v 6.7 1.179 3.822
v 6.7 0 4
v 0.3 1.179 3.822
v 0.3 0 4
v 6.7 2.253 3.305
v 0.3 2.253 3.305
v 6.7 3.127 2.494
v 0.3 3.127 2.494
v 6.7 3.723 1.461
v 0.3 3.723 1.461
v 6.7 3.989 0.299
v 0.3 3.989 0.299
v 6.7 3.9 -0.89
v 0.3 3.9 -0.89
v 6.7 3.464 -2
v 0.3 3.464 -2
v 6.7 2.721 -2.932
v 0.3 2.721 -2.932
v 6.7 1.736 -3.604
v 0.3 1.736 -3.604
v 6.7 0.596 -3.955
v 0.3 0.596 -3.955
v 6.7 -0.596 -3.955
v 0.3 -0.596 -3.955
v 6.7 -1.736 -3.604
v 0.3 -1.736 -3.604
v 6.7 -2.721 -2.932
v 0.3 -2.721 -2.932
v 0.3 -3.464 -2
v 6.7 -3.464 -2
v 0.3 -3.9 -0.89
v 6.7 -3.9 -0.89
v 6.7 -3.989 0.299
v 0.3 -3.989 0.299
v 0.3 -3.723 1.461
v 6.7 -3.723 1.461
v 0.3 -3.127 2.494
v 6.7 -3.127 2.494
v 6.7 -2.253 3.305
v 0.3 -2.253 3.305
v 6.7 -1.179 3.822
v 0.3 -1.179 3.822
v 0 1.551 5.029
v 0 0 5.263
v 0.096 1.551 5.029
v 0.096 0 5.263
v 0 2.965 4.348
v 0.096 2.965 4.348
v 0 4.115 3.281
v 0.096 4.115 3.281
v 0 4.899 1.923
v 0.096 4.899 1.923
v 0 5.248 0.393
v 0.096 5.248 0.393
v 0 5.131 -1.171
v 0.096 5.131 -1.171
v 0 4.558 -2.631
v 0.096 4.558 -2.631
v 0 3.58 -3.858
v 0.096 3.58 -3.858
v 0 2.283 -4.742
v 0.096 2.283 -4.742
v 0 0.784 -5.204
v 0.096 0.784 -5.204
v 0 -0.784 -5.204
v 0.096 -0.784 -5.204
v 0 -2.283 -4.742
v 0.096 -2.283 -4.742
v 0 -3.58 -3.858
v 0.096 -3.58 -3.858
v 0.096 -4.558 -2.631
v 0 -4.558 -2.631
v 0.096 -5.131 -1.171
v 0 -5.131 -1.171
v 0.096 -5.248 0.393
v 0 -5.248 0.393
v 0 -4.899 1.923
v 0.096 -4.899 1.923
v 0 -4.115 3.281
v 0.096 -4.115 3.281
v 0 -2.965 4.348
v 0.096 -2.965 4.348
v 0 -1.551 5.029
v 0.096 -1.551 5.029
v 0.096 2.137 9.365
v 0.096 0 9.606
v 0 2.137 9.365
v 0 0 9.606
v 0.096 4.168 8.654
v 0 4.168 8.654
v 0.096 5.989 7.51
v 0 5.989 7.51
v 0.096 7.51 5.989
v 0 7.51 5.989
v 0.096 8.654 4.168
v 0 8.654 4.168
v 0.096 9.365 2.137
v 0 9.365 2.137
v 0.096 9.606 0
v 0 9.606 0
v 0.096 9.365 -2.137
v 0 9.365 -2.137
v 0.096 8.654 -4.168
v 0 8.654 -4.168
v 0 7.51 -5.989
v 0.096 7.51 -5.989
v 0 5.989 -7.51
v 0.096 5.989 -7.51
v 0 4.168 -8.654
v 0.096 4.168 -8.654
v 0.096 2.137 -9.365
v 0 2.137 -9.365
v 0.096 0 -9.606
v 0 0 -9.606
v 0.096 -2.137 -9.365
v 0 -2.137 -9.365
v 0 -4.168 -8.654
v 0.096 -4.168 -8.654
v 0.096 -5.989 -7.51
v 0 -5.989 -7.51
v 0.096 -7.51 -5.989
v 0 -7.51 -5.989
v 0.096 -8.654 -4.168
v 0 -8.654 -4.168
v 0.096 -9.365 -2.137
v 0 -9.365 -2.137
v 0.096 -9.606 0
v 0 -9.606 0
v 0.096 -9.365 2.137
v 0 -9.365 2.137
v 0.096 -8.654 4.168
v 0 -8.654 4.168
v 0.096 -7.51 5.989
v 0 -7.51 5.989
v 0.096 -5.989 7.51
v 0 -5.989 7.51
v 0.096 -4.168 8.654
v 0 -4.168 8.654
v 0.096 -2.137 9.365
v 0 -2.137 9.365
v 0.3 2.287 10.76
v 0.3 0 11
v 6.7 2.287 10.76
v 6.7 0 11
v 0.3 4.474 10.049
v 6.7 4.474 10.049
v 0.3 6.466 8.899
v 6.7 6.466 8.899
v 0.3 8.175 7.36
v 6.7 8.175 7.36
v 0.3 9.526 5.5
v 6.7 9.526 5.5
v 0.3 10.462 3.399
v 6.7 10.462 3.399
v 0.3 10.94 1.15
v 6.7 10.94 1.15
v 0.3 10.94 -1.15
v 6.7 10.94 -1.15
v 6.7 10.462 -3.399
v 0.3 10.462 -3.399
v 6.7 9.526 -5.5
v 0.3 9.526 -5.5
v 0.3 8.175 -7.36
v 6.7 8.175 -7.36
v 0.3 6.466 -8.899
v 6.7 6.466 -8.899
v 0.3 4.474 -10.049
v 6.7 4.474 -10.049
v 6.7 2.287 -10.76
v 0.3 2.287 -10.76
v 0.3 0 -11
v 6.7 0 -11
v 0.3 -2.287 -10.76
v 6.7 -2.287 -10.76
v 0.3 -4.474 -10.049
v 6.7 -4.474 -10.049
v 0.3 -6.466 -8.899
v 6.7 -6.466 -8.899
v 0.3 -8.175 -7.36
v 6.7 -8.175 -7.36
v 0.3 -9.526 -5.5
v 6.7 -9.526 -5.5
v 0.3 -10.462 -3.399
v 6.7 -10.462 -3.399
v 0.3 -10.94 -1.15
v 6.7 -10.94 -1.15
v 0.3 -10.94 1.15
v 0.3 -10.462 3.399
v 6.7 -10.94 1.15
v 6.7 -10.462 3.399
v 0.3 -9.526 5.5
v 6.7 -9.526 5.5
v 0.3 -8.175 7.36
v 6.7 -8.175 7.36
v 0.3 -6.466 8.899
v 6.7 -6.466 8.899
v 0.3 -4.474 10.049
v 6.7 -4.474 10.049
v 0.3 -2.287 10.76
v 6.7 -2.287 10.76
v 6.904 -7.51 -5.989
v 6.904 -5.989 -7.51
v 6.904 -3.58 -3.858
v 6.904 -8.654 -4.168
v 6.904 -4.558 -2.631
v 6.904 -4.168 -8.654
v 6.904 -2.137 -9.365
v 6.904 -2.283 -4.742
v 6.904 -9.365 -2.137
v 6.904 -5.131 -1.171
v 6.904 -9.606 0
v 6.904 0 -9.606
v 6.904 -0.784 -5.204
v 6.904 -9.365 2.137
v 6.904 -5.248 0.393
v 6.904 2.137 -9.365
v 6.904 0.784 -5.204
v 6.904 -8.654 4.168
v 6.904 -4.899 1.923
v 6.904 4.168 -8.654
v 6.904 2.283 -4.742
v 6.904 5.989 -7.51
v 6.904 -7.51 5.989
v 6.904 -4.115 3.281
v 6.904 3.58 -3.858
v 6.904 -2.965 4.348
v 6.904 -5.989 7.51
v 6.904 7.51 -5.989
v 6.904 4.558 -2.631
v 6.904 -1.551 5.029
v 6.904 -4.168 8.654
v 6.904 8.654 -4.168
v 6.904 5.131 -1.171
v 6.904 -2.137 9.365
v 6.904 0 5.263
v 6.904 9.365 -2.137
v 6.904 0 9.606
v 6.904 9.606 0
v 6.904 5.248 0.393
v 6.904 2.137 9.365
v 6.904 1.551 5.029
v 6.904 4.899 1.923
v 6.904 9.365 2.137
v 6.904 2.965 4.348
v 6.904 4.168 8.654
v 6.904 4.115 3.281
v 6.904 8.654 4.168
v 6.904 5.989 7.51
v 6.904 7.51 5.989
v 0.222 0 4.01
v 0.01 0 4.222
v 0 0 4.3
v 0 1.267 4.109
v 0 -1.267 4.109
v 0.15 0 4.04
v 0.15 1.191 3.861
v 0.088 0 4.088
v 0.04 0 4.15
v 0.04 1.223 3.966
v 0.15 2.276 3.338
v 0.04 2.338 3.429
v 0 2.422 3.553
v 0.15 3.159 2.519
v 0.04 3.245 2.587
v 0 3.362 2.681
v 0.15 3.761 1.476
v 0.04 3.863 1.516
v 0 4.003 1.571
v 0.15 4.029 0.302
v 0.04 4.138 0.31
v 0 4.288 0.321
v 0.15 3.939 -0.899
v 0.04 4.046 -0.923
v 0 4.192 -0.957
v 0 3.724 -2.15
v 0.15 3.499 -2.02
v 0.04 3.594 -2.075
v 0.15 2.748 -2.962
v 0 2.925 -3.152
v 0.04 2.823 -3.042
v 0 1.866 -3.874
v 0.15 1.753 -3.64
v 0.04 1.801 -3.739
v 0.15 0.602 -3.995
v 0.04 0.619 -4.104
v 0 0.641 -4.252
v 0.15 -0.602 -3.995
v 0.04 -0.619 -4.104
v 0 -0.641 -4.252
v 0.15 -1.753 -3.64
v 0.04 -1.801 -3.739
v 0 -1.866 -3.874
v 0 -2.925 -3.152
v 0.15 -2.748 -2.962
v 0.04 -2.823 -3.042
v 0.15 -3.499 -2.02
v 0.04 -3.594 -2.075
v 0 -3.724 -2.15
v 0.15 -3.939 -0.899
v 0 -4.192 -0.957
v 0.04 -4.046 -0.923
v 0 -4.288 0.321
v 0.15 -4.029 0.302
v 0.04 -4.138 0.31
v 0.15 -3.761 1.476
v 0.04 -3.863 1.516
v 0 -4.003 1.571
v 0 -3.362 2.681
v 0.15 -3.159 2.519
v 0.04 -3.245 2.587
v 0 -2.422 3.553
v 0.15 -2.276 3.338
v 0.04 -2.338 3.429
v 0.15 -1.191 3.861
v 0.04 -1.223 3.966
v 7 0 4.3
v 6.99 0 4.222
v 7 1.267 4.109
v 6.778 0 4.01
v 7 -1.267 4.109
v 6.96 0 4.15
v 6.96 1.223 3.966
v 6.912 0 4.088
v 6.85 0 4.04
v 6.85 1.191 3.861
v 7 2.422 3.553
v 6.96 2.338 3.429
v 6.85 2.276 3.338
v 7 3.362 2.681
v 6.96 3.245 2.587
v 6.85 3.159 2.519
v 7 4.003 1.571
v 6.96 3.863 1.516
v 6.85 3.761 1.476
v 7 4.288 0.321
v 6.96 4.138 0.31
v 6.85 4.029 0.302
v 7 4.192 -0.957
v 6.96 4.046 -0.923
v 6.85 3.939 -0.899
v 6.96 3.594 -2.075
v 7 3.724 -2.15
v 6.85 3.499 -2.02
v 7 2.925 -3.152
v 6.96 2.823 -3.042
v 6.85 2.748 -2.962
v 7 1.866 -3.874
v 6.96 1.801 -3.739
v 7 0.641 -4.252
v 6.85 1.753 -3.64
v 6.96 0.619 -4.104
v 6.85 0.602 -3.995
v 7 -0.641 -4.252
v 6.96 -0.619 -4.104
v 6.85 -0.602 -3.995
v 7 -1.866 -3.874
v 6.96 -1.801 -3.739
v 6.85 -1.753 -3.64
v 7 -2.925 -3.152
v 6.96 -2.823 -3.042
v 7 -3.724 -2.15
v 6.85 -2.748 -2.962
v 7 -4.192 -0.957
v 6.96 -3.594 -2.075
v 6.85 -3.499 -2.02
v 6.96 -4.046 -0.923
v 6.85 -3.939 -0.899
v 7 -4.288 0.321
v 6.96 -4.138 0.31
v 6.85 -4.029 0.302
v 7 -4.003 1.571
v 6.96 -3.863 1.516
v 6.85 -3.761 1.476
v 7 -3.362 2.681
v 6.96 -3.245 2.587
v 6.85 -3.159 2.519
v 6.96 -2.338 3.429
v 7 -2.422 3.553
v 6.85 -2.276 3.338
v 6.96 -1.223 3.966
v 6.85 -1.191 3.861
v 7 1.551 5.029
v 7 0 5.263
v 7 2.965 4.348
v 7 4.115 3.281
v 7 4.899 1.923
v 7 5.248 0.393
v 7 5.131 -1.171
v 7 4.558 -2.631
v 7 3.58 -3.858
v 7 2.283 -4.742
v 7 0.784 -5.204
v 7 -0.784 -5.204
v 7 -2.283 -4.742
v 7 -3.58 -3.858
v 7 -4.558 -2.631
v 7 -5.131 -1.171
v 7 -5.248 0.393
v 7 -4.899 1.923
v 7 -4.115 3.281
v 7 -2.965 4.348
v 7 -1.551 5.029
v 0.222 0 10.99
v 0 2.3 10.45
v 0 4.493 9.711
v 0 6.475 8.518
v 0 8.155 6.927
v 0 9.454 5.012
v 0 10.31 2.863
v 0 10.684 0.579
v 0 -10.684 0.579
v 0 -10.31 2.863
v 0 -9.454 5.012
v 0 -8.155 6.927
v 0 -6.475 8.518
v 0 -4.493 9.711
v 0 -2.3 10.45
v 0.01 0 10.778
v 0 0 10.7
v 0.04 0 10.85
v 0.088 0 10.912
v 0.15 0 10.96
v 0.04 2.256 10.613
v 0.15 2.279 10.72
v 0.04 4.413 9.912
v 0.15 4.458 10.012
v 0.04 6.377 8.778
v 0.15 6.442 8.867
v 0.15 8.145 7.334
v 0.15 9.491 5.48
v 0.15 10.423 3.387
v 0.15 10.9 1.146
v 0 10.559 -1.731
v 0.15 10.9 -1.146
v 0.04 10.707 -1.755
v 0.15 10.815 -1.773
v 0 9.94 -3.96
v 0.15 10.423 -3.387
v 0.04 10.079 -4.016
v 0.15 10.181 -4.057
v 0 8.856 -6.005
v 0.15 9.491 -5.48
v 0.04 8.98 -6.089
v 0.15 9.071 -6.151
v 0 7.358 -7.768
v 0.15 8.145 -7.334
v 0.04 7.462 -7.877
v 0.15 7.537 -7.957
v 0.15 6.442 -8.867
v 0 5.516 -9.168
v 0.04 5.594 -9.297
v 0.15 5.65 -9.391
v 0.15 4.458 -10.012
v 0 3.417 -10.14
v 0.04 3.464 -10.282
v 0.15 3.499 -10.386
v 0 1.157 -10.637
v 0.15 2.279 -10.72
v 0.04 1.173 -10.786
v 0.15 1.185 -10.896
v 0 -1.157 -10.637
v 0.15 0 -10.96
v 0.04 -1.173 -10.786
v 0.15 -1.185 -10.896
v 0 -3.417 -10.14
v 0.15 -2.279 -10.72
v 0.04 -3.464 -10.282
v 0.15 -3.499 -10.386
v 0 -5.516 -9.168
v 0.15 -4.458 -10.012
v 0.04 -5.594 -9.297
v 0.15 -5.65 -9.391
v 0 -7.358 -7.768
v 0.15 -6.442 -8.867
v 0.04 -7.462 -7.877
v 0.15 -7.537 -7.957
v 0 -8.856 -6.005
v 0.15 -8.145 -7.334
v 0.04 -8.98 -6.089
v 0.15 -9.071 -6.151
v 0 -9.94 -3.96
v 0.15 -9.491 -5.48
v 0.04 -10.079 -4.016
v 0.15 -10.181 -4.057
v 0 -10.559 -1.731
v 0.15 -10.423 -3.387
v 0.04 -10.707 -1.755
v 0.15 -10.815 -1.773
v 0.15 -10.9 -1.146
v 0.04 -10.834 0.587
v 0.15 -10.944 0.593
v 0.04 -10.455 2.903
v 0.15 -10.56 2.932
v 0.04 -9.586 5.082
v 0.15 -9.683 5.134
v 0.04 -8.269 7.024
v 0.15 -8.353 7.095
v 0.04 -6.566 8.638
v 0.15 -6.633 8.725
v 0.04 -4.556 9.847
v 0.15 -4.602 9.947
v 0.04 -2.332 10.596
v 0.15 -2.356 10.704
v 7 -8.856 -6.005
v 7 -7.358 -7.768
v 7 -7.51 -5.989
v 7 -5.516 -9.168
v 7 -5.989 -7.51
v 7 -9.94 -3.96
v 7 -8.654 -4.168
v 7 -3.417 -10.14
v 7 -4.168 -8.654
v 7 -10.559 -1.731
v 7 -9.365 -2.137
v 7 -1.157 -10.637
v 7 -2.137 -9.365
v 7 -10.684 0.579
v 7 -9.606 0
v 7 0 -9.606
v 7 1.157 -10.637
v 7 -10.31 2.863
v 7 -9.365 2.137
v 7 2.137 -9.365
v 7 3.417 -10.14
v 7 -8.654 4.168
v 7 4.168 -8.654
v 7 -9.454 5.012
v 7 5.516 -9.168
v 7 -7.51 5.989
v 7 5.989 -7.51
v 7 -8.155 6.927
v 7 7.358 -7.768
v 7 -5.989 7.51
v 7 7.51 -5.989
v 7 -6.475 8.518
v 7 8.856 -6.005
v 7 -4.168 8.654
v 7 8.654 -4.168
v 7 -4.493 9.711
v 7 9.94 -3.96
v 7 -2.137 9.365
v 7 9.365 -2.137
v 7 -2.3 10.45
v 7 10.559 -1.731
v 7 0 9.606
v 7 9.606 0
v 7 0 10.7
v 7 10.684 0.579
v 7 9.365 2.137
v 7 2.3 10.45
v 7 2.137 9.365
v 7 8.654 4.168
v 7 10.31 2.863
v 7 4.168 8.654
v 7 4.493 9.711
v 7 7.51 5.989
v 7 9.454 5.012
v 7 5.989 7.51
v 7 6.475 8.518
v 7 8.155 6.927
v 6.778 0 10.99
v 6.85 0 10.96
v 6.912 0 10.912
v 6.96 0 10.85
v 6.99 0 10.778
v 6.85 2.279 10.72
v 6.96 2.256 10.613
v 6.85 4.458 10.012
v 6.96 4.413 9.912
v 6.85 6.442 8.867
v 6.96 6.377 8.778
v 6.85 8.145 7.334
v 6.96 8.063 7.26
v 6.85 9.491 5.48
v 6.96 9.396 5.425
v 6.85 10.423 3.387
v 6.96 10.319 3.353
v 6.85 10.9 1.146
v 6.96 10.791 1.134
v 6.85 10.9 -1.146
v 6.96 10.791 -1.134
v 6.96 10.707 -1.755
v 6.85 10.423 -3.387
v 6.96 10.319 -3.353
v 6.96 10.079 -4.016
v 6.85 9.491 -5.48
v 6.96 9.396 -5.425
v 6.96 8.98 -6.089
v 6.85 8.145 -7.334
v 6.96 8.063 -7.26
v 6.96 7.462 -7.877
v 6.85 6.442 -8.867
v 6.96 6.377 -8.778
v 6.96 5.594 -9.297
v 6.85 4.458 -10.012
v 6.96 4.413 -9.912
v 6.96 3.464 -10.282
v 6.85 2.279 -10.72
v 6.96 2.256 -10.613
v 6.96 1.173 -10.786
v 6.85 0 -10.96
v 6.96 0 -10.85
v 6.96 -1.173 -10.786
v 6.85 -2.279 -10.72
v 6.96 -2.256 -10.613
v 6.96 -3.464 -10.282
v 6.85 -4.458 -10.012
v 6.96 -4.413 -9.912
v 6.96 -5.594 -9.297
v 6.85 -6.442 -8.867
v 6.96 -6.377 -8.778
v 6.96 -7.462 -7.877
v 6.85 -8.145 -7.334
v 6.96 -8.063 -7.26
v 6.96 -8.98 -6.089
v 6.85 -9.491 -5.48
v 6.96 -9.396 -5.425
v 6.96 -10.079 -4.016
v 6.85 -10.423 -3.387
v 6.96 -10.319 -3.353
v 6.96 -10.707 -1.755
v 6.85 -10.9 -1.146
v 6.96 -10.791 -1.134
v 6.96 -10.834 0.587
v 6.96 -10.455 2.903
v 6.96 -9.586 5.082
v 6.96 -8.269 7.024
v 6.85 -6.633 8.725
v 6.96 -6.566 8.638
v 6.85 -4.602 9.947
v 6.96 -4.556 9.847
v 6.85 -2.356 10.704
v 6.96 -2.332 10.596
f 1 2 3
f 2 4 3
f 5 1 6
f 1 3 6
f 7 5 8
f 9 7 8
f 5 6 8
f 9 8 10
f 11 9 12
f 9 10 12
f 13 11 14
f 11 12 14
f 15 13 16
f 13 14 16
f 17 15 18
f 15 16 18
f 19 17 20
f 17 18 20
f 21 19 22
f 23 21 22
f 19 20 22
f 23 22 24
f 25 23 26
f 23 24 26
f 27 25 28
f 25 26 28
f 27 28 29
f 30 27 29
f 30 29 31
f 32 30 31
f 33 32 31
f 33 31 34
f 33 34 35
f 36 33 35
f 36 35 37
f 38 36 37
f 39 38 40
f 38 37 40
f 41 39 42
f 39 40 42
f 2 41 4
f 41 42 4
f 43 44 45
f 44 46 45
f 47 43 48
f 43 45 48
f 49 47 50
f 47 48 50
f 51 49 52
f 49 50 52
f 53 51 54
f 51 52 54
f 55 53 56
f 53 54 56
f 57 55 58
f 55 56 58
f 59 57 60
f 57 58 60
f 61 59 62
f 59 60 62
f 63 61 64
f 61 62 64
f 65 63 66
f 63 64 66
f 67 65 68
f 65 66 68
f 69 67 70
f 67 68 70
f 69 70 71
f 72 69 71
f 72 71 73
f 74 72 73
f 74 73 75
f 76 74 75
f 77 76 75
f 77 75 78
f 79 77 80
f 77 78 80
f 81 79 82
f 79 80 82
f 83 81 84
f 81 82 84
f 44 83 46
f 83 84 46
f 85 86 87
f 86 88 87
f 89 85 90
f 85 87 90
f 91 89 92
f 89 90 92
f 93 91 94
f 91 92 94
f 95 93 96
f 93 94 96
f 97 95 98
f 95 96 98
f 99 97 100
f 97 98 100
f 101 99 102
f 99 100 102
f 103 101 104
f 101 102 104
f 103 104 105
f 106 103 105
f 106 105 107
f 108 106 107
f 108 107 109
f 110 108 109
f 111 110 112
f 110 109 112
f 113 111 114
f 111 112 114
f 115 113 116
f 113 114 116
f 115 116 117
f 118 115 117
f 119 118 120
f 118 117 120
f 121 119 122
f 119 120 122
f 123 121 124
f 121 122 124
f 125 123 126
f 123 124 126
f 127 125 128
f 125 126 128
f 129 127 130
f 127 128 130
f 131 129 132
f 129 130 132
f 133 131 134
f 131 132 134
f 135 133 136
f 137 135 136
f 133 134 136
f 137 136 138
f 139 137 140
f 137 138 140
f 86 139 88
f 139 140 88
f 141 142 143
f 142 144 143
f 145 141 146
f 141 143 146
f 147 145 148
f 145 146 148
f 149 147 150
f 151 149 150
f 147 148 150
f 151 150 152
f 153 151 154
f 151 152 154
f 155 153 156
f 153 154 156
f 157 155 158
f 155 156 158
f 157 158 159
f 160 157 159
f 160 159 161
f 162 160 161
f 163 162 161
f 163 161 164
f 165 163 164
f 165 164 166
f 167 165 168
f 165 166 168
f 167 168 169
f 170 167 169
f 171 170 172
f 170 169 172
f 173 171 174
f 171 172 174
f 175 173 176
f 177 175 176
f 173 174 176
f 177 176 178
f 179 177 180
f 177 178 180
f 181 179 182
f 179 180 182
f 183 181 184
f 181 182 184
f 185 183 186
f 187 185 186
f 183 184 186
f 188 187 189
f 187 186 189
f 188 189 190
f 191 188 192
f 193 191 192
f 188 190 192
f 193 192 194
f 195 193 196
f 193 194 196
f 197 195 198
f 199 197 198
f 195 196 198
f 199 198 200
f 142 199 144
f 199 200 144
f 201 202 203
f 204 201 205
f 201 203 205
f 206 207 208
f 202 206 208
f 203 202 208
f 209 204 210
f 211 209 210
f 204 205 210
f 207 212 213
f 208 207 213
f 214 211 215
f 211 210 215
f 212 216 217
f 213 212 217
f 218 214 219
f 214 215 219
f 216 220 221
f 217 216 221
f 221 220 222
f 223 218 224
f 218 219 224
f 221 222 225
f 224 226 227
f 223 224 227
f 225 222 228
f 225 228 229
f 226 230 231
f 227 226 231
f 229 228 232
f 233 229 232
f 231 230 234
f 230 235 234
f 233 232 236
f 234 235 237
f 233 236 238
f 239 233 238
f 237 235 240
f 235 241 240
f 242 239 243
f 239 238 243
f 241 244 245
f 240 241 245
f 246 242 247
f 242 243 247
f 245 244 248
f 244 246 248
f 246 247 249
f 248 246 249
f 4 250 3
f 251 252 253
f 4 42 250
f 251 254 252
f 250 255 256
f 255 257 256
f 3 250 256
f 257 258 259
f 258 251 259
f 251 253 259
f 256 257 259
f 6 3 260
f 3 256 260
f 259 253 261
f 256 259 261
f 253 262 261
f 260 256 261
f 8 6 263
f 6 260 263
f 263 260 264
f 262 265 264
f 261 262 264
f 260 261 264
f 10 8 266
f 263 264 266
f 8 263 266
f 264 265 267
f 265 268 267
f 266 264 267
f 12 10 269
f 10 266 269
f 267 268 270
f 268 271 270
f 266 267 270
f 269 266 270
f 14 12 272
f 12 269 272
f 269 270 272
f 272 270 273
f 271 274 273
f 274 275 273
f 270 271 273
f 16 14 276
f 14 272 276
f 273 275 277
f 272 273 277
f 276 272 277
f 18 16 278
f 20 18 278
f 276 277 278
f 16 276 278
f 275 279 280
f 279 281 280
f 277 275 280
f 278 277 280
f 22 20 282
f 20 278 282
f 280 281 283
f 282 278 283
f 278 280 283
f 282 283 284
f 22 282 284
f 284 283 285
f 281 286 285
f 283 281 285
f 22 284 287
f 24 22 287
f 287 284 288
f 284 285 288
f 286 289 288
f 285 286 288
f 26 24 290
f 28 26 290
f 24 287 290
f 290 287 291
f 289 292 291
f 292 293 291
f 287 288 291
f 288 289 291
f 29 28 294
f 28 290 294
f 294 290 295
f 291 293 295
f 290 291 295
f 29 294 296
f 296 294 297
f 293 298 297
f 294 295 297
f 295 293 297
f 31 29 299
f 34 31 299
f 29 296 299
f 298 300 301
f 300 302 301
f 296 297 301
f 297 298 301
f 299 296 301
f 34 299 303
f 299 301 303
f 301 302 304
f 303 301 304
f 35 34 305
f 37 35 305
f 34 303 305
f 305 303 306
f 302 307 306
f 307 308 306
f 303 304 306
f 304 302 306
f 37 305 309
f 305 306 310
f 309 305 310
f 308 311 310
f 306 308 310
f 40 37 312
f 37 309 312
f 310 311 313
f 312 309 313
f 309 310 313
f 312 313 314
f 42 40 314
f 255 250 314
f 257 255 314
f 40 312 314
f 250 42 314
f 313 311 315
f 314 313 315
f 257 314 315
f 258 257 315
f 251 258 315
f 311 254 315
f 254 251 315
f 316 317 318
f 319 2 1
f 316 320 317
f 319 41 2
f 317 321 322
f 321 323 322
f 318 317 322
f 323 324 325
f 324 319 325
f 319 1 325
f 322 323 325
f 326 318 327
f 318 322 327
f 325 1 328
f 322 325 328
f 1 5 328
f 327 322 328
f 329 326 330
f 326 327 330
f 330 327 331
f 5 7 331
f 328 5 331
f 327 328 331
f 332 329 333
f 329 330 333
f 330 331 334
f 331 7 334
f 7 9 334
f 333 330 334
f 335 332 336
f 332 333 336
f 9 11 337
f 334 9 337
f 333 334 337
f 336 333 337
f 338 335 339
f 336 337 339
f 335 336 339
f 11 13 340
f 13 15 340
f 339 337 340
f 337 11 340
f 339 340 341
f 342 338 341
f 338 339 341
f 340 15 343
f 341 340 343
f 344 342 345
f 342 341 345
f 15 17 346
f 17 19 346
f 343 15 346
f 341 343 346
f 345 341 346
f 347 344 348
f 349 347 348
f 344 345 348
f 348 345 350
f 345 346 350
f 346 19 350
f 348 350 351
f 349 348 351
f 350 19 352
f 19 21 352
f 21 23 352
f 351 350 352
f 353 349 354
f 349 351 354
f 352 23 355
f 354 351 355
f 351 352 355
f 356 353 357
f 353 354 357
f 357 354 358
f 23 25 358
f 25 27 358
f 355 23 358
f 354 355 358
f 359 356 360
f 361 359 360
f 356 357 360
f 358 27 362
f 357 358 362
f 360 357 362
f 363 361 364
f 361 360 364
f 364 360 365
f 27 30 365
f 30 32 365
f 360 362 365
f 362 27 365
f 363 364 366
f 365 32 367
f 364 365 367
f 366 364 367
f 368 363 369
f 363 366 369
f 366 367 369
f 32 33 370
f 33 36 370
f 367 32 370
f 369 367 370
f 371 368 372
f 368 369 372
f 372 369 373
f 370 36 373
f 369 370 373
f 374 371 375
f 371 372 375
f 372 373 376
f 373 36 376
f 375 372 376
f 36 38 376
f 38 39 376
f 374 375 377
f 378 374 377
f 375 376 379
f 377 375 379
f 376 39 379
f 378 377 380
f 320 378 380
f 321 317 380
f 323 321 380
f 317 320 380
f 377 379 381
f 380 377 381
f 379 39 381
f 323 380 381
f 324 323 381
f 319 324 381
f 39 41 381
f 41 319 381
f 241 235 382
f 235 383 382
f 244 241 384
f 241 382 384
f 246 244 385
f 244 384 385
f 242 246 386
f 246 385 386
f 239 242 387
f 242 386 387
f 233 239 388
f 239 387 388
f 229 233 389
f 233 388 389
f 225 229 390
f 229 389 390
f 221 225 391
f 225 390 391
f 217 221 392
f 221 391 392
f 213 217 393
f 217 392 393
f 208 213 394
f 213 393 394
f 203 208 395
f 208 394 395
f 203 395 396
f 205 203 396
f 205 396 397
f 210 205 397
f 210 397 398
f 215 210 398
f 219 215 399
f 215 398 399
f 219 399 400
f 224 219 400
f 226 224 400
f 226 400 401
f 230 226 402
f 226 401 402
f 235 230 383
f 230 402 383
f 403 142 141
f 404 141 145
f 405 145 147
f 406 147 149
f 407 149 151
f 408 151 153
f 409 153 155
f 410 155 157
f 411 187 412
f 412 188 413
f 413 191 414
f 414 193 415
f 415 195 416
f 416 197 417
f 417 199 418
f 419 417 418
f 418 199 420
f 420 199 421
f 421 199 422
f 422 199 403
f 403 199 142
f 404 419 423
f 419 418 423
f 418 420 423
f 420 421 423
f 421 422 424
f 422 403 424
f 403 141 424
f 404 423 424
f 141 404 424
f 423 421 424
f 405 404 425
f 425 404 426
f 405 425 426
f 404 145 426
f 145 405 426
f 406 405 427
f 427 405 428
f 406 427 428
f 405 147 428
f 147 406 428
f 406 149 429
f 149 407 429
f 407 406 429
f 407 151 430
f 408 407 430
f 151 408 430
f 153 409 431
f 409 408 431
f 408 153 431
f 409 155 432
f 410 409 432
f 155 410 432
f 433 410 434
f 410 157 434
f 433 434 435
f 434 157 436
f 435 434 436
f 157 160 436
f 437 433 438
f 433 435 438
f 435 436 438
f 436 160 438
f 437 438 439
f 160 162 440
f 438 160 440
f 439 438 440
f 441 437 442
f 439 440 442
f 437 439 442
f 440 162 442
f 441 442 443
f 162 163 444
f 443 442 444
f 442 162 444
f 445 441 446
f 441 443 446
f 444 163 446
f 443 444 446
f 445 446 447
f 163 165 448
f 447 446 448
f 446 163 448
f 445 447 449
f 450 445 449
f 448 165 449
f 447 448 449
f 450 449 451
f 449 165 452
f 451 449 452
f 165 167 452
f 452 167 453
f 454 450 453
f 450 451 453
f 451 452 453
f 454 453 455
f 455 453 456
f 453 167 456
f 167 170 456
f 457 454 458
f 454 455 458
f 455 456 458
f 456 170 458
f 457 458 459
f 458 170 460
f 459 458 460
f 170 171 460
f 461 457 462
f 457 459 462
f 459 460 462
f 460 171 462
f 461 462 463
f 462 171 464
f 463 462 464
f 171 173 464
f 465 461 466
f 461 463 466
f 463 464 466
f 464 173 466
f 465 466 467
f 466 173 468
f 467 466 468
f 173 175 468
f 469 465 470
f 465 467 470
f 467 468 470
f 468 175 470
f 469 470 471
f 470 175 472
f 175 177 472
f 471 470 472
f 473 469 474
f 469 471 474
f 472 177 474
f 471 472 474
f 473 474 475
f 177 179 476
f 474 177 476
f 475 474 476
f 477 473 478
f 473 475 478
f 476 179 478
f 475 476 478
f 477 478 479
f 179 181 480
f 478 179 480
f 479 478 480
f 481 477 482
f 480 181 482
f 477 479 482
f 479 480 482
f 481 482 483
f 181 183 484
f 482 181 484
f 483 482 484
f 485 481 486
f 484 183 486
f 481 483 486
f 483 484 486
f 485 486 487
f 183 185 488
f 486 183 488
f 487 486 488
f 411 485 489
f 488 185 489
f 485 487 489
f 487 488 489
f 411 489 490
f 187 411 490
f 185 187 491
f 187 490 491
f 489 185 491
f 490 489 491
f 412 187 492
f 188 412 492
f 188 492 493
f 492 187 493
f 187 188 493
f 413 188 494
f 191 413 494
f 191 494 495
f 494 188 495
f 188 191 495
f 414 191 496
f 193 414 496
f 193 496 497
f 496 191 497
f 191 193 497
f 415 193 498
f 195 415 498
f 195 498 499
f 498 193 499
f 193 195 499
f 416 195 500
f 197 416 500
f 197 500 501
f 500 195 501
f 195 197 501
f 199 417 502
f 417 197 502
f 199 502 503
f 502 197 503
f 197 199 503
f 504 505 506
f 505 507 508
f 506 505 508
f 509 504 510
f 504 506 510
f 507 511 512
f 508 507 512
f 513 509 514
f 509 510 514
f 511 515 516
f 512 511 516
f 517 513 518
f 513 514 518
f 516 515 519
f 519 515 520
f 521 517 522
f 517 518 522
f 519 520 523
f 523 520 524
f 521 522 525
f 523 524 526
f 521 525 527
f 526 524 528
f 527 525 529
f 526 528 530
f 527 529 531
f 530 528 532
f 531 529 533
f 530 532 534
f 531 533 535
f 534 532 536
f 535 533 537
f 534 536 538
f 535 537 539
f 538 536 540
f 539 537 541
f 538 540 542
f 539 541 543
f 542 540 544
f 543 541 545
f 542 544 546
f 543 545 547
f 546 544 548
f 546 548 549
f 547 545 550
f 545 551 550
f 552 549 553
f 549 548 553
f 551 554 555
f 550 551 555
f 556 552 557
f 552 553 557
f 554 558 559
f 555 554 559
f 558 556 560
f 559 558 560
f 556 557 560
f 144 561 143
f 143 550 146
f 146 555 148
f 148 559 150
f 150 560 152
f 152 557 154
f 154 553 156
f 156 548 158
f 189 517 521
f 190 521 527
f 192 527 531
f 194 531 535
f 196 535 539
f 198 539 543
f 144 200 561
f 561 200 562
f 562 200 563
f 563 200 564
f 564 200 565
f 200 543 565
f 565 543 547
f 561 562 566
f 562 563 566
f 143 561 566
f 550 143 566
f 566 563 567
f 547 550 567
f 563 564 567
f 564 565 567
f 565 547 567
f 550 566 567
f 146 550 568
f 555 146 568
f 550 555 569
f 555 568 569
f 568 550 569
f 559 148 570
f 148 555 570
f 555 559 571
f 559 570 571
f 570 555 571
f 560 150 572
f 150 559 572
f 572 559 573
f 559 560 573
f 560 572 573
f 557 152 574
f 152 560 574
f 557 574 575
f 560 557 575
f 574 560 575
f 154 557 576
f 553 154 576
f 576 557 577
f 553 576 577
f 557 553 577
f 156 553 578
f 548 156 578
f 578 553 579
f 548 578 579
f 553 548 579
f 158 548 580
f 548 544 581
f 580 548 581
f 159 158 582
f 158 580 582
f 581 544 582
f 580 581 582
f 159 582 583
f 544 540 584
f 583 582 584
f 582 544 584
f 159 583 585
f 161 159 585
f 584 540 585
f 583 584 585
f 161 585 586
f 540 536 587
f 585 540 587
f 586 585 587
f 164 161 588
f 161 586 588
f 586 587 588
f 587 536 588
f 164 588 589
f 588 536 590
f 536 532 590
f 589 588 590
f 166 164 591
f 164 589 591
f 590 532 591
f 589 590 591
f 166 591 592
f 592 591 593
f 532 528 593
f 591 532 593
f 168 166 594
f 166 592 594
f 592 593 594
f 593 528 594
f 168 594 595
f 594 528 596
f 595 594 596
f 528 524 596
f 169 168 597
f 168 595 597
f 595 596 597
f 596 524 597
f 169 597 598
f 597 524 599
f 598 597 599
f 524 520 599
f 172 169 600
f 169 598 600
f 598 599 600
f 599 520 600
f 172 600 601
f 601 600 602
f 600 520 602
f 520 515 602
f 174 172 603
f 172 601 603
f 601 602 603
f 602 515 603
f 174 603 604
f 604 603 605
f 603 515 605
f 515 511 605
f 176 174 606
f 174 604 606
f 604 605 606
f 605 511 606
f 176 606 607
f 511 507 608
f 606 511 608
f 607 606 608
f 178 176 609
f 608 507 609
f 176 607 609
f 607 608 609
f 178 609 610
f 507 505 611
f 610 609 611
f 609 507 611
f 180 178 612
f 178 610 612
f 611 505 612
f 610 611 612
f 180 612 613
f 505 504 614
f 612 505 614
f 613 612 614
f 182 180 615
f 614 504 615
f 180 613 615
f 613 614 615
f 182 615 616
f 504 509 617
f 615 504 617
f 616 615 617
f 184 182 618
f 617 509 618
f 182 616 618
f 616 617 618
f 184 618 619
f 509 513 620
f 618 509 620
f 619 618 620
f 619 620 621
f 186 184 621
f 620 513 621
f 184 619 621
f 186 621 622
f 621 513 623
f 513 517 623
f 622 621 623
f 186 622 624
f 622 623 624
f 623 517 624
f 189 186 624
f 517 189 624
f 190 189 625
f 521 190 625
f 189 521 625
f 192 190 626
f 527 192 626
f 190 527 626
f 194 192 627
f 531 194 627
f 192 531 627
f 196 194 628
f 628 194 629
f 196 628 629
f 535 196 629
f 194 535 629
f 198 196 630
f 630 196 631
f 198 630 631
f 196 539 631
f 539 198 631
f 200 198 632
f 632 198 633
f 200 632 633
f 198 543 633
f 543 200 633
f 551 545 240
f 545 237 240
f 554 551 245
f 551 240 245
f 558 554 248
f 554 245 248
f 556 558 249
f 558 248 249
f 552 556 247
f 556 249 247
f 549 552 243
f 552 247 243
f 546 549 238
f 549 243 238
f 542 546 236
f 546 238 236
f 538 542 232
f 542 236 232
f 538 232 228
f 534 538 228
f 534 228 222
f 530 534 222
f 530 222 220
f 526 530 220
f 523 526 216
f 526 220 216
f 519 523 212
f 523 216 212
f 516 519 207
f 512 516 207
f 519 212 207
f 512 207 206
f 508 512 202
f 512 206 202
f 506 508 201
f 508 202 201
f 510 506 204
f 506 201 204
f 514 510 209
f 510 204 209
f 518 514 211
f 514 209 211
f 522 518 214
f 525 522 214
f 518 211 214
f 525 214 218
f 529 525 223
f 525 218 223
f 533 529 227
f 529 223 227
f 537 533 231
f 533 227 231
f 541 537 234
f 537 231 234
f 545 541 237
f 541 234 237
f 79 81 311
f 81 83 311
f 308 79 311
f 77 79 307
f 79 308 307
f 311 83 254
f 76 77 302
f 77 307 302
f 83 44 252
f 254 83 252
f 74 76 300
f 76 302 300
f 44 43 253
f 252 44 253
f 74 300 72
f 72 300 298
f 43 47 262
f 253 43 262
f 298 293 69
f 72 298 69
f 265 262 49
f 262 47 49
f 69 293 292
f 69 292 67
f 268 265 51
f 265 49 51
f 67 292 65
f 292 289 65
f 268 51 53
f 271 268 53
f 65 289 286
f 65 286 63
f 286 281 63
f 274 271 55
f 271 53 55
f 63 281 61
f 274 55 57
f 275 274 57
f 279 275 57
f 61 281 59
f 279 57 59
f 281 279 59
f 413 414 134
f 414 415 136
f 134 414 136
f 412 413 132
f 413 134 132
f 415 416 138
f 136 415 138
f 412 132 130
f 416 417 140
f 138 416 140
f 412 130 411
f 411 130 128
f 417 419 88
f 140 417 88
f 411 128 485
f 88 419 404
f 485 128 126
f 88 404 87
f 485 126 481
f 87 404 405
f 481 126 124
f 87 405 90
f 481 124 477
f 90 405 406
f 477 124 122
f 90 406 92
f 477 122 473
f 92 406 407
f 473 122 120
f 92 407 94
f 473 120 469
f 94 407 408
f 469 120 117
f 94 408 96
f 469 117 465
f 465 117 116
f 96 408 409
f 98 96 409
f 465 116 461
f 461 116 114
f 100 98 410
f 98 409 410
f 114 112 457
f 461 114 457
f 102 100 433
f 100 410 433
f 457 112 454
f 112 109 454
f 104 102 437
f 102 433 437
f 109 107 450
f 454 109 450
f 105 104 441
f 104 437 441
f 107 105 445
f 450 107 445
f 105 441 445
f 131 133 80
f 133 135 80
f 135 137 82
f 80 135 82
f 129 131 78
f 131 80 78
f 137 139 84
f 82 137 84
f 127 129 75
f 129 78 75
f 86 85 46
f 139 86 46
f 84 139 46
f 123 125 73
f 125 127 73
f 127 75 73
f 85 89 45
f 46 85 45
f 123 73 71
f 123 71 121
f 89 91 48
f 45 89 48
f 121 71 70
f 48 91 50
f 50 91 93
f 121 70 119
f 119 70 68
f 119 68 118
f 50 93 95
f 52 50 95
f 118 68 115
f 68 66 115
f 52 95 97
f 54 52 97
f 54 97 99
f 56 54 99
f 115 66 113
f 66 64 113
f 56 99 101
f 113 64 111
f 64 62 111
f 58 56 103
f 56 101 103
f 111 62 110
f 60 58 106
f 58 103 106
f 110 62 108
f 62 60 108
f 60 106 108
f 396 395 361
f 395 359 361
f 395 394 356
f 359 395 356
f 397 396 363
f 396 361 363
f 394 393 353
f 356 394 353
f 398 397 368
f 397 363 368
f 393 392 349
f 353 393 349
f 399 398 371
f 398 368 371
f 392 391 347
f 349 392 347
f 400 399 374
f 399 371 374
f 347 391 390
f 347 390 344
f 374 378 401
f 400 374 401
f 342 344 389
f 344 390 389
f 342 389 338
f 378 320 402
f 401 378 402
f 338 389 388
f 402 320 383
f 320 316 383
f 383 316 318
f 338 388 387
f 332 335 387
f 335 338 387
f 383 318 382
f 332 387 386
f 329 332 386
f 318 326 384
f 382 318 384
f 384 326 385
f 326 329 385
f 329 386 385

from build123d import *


with BuildPart() as part:
    # Sketch1 → Revolve1 (revolve)
    with BuildSketch(Plane(origin=(0, 0, 0), x_dir=(-1, 0, 0), z_dir=(0, 0, -1)), mode=Mode.PRIVATE) as revolve1_sk:
        with BuildLine():
            Line((-6.7, 4), (-0.3, 4))
            ThreePointArc((-0.3, 4), (-0.087867966, 4.087867966), (0, 4.3))
            Line((0, 4.3), (0, 5.2629))
            Line((0, 5.2629), (-0.0956, 5.2629))
            Line((-0.0956, 5.2629), (-0.0956, 9.6056))
            Line((-0.0956, 9.6056), (0, 9.6056))
            Line((0, 9.6056), (0, 10.7))
            ThreePointArc((0, 10.7), (-0.087867966, 10.912132034), (-0.3, 11))
            Line((-0.3, 11), (-6.7, 11))
            ThreePointArc((-6.7, 11), (-6.912132034, 10.912132034), (-7, 10.7))
            Line((-7, 10.7), (-7, 9.6056))
            Line((-7, 9.6056), (-6.9044, 9.6056))
            Line((-6.9044, 9.6056), (-6.9044, 5.2629))
            Line((-6.9044, 5.2629), (-7, 5.2629))
            Line((-7, 5.2629), (-7, 4.3))
            ThreePointArc((-7, 4.3), (-6.912132034, 4.087867966), (-6.7, 4))
        make_face()
    revolve(revolve1_sk.sketch.rotate(Axis((7.003537608, 0, 0), (-1, 0, 0)), 270), axis=Axis((7.003537608, 0, 0), (-1, 0, 0)))


solid = part.part
